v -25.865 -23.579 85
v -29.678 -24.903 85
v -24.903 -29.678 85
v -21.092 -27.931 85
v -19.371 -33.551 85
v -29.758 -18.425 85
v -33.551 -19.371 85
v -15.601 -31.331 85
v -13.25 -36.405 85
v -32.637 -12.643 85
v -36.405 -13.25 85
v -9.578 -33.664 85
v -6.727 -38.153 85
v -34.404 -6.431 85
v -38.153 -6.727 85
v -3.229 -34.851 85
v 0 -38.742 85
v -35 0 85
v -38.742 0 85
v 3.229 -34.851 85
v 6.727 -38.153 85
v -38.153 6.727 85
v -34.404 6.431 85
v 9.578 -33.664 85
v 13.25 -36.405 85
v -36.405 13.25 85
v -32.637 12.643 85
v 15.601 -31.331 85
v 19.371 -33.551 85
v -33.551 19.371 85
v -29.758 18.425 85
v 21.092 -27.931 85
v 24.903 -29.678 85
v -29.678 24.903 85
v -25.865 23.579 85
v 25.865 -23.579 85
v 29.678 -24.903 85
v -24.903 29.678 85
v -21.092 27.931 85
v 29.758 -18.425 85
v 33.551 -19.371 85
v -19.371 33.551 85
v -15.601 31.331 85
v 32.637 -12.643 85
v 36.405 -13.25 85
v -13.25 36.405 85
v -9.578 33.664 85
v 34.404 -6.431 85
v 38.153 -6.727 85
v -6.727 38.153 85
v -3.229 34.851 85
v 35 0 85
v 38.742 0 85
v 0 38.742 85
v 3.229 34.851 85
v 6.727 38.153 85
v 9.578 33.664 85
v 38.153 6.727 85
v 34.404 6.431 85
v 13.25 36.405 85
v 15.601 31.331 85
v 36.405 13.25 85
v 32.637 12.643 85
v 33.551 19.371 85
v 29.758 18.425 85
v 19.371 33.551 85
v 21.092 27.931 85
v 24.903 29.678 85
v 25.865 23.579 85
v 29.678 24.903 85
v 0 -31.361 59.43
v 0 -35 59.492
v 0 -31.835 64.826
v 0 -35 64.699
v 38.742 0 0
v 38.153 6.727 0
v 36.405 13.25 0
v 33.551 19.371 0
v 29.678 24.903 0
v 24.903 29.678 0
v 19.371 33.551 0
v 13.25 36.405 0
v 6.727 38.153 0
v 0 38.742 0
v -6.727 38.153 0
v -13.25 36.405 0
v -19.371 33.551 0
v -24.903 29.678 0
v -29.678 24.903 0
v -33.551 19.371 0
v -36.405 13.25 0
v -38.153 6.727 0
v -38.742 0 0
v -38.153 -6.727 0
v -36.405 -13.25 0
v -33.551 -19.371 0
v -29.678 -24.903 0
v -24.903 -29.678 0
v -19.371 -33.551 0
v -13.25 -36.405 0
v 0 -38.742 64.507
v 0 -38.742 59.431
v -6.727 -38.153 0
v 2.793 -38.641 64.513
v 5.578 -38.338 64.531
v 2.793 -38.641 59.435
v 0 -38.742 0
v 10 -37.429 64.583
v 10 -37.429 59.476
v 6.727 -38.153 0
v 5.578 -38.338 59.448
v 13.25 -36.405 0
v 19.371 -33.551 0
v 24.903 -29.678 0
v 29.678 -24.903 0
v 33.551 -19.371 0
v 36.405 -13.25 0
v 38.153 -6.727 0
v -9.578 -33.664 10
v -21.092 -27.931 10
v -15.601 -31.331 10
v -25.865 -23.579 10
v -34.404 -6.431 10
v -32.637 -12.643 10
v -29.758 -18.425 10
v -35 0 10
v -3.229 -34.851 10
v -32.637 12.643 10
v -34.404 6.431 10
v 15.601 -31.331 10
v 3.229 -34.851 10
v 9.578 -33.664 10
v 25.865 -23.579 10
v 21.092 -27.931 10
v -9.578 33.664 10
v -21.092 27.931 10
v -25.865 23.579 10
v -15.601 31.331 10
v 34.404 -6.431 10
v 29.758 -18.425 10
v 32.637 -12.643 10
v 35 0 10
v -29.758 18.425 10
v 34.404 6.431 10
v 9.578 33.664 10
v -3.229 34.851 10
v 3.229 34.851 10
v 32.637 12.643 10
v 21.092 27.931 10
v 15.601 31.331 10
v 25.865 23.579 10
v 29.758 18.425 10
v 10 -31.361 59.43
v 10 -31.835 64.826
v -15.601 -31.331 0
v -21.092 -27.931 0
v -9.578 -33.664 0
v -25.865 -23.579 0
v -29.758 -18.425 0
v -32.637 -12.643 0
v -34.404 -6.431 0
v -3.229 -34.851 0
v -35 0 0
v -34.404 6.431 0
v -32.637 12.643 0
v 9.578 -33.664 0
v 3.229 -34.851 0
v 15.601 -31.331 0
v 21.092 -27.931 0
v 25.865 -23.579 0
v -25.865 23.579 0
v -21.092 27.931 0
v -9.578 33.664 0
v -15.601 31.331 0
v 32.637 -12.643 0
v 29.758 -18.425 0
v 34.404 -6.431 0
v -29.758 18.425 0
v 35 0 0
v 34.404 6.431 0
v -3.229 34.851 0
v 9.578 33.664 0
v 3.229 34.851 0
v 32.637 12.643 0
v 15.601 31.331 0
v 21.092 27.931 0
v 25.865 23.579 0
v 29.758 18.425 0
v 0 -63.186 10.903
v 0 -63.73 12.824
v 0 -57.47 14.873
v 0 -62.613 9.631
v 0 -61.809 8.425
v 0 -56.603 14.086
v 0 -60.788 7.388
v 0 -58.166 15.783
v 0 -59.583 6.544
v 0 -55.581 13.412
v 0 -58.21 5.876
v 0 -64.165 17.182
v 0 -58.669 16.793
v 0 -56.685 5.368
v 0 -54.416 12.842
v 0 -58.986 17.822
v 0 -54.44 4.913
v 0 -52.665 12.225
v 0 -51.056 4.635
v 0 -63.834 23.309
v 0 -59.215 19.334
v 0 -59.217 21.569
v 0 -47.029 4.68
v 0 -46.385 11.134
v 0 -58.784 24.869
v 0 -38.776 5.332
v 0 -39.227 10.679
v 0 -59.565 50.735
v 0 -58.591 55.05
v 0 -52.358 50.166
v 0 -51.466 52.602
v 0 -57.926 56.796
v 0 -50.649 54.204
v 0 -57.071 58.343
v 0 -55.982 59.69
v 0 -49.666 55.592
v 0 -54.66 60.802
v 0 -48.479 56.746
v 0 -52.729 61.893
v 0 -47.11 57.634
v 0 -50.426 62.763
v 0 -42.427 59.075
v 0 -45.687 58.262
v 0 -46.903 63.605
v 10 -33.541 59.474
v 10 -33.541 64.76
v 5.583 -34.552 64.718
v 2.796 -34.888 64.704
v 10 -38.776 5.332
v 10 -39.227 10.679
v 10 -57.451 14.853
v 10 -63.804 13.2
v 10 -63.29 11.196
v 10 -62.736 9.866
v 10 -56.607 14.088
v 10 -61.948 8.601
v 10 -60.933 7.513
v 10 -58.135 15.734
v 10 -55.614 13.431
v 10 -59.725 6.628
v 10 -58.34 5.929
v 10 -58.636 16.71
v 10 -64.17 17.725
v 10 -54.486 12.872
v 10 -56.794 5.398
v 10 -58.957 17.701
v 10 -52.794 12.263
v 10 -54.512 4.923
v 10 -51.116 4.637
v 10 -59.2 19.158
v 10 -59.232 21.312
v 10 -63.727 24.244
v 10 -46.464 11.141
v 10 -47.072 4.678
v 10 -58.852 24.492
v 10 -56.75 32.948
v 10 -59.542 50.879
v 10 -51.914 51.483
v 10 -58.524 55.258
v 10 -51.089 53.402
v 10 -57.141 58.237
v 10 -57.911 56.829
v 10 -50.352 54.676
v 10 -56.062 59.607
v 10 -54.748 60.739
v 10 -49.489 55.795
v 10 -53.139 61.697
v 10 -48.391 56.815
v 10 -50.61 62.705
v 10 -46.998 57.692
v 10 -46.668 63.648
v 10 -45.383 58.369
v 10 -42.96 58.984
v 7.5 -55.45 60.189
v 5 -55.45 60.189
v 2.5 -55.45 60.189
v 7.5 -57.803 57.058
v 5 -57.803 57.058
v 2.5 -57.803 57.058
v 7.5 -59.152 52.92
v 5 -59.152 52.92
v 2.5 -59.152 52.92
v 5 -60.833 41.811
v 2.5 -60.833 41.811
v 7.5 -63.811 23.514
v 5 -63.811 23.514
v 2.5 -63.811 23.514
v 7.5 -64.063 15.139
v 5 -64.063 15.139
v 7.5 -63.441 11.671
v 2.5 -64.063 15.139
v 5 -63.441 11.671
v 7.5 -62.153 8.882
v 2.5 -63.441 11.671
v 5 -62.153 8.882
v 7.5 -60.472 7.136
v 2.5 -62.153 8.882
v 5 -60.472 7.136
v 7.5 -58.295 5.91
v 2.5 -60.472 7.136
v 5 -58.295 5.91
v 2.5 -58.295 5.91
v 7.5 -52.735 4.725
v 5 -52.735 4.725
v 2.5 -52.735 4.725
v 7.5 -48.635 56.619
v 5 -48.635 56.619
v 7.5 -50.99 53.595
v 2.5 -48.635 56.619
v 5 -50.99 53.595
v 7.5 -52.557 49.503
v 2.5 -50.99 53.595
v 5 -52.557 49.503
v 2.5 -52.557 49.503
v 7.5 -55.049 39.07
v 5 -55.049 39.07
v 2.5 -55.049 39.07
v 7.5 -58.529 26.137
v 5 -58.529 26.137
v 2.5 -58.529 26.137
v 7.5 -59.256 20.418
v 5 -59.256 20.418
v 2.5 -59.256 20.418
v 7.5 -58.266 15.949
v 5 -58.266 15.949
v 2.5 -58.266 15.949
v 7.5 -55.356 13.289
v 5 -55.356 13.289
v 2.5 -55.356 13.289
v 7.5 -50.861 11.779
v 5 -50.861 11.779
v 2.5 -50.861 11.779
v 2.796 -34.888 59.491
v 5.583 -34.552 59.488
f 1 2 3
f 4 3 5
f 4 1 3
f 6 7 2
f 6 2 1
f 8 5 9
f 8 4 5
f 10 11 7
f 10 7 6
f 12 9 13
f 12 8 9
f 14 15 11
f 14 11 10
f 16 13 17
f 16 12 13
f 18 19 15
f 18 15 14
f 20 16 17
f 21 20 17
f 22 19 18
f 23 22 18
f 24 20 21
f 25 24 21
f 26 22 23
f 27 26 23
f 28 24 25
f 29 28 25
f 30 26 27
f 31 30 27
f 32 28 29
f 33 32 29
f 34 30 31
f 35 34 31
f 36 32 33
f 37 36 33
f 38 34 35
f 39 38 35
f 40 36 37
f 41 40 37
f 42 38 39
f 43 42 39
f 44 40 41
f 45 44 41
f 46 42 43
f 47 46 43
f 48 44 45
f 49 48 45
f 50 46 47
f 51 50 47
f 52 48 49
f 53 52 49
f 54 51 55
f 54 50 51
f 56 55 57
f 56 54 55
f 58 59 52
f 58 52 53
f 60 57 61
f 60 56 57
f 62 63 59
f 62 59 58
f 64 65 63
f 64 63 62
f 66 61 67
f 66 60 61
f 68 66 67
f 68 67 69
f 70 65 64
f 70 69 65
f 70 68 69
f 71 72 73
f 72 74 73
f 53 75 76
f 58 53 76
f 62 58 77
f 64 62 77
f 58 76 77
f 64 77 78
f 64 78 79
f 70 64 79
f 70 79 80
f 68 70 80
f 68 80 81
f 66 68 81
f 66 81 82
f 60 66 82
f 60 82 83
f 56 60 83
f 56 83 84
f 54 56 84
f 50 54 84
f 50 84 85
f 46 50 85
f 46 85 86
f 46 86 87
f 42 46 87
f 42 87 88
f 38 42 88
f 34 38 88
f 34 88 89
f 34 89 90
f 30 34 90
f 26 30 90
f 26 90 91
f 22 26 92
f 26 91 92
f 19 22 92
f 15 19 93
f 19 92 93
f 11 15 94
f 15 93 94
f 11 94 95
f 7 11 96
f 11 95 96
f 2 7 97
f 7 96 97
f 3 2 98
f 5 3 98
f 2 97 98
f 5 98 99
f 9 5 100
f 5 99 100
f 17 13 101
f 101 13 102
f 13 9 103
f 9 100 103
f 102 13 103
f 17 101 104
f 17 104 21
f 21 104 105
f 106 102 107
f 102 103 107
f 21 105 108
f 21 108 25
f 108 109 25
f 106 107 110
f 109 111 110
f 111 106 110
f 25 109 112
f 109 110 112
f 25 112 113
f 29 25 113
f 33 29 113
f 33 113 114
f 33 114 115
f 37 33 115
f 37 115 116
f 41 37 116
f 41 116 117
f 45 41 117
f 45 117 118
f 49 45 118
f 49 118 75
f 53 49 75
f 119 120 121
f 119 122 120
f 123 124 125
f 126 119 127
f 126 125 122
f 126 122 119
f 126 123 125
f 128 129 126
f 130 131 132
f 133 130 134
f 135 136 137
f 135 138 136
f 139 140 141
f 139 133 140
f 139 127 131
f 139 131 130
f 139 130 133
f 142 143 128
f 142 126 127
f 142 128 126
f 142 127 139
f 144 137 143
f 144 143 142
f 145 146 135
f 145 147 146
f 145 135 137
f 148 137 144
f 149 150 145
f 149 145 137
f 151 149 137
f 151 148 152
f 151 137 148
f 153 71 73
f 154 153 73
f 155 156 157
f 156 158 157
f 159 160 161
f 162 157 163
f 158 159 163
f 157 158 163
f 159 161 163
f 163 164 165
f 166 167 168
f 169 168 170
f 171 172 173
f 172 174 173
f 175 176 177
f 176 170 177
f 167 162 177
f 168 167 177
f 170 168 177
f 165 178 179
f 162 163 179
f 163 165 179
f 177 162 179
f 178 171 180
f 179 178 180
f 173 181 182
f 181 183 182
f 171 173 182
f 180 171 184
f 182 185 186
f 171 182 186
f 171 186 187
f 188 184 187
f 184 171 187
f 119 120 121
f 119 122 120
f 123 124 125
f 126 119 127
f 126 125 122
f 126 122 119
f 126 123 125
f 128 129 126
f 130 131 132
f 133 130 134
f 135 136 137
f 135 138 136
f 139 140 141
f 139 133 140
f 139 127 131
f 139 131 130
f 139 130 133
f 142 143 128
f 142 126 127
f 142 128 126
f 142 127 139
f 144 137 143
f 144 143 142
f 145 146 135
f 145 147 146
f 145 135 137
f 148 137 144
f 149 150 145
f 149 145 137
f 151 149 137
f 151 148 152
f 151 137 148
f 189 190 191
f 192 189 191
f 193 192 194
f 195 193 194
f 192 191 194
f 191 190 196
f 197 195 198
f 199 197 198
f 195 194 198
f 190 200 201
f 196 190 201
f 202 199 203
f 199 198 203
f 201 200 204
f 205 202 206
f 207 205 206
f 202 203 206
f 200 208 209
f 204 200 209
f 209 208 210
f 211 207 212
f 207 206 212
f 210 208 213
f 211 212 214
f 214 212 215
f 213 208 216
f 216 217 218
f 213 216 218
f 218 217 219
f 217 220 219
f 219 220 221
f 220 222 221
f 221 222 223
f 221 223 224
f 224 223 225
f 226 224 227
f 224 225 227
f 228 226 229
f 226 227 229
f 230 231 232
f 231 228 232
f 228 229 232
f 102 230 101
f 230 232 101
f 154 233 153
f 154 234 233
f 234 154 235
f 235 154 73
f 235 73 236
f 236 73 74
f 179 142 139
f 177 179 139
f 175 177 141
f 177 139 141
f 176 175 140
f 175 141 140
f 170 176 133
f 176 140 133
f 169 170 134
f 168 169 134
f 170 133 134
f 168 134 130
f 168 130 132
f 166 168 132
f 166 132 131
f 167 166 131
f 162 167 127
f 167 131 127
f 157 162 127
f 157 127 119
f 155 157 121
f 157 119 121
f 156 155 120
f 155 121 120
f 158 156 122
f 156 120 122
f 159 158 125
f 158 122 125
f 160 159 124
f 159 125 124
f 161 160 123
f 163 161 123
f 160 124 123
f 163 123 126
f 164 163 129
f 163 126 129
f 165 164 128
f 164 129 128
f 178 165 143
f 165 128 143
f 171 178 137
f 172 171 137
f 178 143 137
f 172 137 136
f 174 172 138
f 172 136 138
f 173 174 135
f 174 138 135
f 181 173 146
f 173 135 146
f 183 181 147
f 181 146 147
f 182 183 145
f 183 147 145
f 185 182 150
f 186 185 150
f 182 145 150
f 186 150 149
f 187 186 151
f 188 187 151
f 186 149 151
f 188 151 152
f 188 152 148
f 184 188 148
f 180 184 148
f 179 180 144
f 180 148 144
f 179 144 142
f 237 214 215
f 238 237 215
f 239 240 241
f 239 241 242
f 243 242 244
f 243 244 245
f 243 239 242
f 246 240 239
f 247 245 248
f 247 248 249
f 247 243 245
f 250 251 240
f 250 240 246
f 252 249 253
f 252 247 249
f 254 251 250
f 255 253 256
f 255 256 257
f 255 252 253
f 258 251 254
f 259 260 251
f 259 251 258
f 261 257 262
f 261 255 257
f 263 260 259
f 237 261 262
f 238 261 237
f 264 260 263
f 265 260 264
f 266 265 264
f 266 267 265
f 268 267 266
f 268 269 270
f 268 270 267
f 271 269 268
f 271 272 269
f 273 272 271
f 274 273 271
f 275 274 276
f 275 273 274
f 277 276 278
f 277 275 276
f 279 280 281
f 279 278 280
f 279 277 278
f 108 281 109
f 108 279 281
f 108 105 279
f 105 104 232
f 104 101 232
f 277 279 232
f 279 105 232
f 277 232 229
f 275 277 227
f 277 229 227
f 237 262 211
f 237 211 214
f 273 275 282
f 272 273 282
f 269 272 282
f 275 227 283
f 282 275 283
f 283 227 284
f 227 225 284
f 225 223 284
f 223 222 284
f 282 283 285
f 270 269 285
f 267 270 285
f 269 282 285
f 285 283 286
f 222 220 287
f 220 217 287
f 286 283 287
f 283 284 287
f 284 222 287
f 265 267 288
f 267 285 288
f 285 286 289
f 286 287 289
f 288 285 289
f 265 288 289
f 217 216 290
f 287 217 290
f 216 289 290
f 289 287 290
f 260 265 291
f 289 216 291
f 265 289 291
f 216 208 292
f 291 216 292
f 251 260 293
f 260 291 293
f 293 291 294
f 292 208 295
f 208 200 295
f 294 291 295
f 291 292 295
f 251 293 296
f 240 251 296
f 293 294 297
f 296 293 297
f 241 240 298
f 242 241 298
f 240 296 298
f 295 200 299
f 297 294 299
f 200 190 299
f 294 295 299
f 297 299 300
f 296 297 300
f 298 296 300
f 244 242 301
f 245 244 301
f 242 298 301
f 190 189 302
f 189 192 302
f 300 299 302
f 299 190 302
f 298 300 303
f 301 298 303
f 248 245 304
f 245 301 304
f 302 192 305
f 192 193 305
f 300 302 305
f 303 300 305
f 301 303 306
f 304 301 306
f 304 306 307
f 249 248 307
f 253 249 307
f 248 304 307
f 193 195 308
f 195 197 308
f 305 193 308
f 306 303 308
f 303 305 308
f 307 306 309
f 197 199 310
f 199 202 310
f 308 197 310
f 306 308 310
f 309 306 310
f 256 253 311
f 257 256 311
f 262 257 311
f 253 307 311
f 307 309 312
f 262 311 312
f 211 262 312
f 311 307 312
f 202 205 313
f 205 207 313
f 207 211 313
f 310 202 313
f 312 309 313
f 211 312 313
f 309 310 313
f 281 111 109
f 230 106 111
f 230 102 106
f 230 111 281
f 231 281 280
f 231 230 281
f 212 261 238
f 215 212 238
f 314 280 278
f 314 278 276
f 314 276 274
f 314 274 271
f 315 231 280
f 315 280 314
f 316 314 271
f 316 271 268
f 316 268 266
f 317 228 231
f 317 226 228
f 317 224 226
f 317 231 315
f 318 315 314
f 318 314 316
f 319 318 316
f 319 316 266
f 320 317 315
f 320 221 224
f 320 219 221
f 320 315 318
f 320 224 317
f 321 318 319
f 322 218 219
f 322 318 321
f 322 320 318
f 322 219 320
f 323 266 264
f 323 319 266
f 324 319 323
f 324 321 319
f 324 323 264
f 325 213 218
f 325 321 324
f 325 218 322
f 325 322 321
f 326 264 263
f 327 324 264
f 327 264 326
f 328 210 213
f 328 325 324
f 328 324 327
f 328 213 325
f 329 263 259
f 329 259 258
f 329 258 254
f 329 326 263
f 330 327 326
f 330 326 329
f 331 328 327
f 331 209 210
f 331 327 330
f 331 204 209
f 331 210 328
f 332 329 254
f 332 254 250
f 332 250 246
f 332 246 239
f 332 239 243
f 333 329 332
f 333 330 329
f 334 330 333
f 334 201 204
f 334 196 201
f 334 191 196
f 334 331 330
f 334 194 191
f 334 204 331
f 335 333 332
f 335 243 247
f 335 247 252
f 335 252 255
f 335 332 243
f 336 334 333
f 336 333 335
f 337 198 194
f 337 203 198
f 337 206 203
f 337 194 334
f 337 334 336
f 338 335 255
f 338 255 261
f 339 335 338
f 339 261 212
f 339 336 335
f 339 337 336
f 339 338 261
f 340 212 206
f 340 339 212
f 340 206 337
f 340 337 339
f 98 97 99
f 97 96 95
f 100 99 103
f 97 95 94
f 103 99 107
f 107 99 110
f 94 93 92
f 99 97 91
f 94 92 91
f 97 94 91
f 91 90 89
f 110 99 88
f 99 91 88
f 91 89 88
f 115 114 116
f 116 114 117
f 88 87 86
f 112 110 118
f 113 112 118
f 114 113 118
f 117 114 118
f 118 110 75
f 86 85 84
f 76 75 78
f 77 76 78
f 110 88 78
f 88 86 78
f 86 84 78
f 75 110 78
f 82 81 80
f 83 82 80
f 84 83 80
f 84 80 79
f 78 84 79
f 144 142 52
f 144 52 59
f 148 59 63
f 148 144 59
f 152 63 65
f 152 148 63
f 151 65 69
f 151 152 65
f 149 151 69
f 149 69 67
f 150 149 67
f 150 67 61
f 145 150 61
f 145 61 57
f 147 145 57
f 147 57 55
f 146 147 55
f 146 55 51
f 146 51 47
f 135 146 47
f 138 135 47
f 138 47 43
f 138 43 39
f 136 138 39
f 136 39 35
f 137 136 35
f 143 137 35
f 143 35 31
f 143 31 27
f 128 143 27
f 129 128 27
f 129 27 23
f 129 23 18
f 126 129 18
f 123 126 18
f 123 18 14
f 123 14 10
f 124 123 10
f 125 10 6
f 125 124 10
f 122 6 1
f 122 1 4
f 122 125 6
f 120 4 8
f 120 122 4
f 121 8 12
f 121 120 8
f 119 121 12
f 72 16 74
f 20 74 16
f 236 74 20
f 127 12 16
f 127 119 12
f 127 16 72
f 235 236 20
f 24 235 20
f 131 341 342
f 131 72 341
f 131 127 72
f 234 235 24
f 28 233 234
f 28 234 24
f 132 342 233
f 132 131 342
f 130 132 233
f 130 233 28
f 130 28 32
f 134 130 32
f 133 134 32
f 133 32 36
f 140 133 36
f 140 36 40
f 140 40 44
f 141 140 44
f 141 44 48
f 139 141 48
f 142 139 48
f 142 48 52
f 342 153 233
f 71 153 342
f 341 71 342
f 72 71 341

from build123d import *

# Parameters (mm, degrees)
F0_R     = 38.7417924646
F0_R_2   = 35
F1_DEPTH = 85
F2_R     = 37.823926557
F3_DEPTH = 10
F4_DEPTH = 10
F6_DEPTH = 10


with BuildPart() as f1:
    # F0 (on Top) → F1 (new body)
    with BuildSketch(Plane.XY):
        Circle(F0_R)
        Circle(F0_R_2, mode=Mode.SUBTRACT)
    extrude(amount=F1_DEPTH)

    # F2 (on Top) → F3 (join)
    with BuildSketch(Plane.XY):
        Circle(F2_R)
    extrude(amount=F3_DEPTH)


with BuildPart() as f4:
    # F4 (new): a face of the model
    f4_faces = [f1.part.faces().sort_by_distance(p)[0] for p in [
        (0, 0, 10),
    ]]
    extrude(f4_faces, amount=-F4_DEPTH)


with BuildPart() as f1_1:
    add(f1.part)

    # F5 (on Right) → F6 (join)
    with BuildSketch(Plane.YZ):
        with BuildLine():
            Line((-31.3608907163, 59.4299100339), (-31.8346694112, 64.8258551955))
            add(Edge.make_bspline(
                [(-31.8346694112, 64.8258551955), (-41.38433925, 64.4591015217), (-59.4528021533, 63.7651848458), (-59.5290389729, 42.1532722818), (-69.9789196059, 2.3613791422), (-48.586554243, 4.3980298153), (-38.7761965394, 5.332020577)],
                knots=[0, 0, 0, 0, 0.2467021065, 0.4667729811, 0.755466602, 1, 1, 1, 1], degree=3))
            Line((-38.7761965394, 5.332020577), (-39.2265208066, 10.6786340475))
            add(Edge.make_bspline(
                [(-31.3608907163, 59.4299100339), (-38.1323724891, 59.5802666318), (-51.9003981798, 59.8859771945), (-53.7821712318, 39.2212378706), (-64.6205675672, 11.8915510506), (-47.4525440805, 11.0715404476), (-39.2265208066, 10.6786340475)],
                knots=[0, 0, 0, 0, 0.2352618161, 0.4783429738, 0.7500491049, 1, 1, 1, 1], degree=3))
        make_face()
    extrude(amount=F6_DEPTH)


solid = Compound([f4.part, f1_1.part])
